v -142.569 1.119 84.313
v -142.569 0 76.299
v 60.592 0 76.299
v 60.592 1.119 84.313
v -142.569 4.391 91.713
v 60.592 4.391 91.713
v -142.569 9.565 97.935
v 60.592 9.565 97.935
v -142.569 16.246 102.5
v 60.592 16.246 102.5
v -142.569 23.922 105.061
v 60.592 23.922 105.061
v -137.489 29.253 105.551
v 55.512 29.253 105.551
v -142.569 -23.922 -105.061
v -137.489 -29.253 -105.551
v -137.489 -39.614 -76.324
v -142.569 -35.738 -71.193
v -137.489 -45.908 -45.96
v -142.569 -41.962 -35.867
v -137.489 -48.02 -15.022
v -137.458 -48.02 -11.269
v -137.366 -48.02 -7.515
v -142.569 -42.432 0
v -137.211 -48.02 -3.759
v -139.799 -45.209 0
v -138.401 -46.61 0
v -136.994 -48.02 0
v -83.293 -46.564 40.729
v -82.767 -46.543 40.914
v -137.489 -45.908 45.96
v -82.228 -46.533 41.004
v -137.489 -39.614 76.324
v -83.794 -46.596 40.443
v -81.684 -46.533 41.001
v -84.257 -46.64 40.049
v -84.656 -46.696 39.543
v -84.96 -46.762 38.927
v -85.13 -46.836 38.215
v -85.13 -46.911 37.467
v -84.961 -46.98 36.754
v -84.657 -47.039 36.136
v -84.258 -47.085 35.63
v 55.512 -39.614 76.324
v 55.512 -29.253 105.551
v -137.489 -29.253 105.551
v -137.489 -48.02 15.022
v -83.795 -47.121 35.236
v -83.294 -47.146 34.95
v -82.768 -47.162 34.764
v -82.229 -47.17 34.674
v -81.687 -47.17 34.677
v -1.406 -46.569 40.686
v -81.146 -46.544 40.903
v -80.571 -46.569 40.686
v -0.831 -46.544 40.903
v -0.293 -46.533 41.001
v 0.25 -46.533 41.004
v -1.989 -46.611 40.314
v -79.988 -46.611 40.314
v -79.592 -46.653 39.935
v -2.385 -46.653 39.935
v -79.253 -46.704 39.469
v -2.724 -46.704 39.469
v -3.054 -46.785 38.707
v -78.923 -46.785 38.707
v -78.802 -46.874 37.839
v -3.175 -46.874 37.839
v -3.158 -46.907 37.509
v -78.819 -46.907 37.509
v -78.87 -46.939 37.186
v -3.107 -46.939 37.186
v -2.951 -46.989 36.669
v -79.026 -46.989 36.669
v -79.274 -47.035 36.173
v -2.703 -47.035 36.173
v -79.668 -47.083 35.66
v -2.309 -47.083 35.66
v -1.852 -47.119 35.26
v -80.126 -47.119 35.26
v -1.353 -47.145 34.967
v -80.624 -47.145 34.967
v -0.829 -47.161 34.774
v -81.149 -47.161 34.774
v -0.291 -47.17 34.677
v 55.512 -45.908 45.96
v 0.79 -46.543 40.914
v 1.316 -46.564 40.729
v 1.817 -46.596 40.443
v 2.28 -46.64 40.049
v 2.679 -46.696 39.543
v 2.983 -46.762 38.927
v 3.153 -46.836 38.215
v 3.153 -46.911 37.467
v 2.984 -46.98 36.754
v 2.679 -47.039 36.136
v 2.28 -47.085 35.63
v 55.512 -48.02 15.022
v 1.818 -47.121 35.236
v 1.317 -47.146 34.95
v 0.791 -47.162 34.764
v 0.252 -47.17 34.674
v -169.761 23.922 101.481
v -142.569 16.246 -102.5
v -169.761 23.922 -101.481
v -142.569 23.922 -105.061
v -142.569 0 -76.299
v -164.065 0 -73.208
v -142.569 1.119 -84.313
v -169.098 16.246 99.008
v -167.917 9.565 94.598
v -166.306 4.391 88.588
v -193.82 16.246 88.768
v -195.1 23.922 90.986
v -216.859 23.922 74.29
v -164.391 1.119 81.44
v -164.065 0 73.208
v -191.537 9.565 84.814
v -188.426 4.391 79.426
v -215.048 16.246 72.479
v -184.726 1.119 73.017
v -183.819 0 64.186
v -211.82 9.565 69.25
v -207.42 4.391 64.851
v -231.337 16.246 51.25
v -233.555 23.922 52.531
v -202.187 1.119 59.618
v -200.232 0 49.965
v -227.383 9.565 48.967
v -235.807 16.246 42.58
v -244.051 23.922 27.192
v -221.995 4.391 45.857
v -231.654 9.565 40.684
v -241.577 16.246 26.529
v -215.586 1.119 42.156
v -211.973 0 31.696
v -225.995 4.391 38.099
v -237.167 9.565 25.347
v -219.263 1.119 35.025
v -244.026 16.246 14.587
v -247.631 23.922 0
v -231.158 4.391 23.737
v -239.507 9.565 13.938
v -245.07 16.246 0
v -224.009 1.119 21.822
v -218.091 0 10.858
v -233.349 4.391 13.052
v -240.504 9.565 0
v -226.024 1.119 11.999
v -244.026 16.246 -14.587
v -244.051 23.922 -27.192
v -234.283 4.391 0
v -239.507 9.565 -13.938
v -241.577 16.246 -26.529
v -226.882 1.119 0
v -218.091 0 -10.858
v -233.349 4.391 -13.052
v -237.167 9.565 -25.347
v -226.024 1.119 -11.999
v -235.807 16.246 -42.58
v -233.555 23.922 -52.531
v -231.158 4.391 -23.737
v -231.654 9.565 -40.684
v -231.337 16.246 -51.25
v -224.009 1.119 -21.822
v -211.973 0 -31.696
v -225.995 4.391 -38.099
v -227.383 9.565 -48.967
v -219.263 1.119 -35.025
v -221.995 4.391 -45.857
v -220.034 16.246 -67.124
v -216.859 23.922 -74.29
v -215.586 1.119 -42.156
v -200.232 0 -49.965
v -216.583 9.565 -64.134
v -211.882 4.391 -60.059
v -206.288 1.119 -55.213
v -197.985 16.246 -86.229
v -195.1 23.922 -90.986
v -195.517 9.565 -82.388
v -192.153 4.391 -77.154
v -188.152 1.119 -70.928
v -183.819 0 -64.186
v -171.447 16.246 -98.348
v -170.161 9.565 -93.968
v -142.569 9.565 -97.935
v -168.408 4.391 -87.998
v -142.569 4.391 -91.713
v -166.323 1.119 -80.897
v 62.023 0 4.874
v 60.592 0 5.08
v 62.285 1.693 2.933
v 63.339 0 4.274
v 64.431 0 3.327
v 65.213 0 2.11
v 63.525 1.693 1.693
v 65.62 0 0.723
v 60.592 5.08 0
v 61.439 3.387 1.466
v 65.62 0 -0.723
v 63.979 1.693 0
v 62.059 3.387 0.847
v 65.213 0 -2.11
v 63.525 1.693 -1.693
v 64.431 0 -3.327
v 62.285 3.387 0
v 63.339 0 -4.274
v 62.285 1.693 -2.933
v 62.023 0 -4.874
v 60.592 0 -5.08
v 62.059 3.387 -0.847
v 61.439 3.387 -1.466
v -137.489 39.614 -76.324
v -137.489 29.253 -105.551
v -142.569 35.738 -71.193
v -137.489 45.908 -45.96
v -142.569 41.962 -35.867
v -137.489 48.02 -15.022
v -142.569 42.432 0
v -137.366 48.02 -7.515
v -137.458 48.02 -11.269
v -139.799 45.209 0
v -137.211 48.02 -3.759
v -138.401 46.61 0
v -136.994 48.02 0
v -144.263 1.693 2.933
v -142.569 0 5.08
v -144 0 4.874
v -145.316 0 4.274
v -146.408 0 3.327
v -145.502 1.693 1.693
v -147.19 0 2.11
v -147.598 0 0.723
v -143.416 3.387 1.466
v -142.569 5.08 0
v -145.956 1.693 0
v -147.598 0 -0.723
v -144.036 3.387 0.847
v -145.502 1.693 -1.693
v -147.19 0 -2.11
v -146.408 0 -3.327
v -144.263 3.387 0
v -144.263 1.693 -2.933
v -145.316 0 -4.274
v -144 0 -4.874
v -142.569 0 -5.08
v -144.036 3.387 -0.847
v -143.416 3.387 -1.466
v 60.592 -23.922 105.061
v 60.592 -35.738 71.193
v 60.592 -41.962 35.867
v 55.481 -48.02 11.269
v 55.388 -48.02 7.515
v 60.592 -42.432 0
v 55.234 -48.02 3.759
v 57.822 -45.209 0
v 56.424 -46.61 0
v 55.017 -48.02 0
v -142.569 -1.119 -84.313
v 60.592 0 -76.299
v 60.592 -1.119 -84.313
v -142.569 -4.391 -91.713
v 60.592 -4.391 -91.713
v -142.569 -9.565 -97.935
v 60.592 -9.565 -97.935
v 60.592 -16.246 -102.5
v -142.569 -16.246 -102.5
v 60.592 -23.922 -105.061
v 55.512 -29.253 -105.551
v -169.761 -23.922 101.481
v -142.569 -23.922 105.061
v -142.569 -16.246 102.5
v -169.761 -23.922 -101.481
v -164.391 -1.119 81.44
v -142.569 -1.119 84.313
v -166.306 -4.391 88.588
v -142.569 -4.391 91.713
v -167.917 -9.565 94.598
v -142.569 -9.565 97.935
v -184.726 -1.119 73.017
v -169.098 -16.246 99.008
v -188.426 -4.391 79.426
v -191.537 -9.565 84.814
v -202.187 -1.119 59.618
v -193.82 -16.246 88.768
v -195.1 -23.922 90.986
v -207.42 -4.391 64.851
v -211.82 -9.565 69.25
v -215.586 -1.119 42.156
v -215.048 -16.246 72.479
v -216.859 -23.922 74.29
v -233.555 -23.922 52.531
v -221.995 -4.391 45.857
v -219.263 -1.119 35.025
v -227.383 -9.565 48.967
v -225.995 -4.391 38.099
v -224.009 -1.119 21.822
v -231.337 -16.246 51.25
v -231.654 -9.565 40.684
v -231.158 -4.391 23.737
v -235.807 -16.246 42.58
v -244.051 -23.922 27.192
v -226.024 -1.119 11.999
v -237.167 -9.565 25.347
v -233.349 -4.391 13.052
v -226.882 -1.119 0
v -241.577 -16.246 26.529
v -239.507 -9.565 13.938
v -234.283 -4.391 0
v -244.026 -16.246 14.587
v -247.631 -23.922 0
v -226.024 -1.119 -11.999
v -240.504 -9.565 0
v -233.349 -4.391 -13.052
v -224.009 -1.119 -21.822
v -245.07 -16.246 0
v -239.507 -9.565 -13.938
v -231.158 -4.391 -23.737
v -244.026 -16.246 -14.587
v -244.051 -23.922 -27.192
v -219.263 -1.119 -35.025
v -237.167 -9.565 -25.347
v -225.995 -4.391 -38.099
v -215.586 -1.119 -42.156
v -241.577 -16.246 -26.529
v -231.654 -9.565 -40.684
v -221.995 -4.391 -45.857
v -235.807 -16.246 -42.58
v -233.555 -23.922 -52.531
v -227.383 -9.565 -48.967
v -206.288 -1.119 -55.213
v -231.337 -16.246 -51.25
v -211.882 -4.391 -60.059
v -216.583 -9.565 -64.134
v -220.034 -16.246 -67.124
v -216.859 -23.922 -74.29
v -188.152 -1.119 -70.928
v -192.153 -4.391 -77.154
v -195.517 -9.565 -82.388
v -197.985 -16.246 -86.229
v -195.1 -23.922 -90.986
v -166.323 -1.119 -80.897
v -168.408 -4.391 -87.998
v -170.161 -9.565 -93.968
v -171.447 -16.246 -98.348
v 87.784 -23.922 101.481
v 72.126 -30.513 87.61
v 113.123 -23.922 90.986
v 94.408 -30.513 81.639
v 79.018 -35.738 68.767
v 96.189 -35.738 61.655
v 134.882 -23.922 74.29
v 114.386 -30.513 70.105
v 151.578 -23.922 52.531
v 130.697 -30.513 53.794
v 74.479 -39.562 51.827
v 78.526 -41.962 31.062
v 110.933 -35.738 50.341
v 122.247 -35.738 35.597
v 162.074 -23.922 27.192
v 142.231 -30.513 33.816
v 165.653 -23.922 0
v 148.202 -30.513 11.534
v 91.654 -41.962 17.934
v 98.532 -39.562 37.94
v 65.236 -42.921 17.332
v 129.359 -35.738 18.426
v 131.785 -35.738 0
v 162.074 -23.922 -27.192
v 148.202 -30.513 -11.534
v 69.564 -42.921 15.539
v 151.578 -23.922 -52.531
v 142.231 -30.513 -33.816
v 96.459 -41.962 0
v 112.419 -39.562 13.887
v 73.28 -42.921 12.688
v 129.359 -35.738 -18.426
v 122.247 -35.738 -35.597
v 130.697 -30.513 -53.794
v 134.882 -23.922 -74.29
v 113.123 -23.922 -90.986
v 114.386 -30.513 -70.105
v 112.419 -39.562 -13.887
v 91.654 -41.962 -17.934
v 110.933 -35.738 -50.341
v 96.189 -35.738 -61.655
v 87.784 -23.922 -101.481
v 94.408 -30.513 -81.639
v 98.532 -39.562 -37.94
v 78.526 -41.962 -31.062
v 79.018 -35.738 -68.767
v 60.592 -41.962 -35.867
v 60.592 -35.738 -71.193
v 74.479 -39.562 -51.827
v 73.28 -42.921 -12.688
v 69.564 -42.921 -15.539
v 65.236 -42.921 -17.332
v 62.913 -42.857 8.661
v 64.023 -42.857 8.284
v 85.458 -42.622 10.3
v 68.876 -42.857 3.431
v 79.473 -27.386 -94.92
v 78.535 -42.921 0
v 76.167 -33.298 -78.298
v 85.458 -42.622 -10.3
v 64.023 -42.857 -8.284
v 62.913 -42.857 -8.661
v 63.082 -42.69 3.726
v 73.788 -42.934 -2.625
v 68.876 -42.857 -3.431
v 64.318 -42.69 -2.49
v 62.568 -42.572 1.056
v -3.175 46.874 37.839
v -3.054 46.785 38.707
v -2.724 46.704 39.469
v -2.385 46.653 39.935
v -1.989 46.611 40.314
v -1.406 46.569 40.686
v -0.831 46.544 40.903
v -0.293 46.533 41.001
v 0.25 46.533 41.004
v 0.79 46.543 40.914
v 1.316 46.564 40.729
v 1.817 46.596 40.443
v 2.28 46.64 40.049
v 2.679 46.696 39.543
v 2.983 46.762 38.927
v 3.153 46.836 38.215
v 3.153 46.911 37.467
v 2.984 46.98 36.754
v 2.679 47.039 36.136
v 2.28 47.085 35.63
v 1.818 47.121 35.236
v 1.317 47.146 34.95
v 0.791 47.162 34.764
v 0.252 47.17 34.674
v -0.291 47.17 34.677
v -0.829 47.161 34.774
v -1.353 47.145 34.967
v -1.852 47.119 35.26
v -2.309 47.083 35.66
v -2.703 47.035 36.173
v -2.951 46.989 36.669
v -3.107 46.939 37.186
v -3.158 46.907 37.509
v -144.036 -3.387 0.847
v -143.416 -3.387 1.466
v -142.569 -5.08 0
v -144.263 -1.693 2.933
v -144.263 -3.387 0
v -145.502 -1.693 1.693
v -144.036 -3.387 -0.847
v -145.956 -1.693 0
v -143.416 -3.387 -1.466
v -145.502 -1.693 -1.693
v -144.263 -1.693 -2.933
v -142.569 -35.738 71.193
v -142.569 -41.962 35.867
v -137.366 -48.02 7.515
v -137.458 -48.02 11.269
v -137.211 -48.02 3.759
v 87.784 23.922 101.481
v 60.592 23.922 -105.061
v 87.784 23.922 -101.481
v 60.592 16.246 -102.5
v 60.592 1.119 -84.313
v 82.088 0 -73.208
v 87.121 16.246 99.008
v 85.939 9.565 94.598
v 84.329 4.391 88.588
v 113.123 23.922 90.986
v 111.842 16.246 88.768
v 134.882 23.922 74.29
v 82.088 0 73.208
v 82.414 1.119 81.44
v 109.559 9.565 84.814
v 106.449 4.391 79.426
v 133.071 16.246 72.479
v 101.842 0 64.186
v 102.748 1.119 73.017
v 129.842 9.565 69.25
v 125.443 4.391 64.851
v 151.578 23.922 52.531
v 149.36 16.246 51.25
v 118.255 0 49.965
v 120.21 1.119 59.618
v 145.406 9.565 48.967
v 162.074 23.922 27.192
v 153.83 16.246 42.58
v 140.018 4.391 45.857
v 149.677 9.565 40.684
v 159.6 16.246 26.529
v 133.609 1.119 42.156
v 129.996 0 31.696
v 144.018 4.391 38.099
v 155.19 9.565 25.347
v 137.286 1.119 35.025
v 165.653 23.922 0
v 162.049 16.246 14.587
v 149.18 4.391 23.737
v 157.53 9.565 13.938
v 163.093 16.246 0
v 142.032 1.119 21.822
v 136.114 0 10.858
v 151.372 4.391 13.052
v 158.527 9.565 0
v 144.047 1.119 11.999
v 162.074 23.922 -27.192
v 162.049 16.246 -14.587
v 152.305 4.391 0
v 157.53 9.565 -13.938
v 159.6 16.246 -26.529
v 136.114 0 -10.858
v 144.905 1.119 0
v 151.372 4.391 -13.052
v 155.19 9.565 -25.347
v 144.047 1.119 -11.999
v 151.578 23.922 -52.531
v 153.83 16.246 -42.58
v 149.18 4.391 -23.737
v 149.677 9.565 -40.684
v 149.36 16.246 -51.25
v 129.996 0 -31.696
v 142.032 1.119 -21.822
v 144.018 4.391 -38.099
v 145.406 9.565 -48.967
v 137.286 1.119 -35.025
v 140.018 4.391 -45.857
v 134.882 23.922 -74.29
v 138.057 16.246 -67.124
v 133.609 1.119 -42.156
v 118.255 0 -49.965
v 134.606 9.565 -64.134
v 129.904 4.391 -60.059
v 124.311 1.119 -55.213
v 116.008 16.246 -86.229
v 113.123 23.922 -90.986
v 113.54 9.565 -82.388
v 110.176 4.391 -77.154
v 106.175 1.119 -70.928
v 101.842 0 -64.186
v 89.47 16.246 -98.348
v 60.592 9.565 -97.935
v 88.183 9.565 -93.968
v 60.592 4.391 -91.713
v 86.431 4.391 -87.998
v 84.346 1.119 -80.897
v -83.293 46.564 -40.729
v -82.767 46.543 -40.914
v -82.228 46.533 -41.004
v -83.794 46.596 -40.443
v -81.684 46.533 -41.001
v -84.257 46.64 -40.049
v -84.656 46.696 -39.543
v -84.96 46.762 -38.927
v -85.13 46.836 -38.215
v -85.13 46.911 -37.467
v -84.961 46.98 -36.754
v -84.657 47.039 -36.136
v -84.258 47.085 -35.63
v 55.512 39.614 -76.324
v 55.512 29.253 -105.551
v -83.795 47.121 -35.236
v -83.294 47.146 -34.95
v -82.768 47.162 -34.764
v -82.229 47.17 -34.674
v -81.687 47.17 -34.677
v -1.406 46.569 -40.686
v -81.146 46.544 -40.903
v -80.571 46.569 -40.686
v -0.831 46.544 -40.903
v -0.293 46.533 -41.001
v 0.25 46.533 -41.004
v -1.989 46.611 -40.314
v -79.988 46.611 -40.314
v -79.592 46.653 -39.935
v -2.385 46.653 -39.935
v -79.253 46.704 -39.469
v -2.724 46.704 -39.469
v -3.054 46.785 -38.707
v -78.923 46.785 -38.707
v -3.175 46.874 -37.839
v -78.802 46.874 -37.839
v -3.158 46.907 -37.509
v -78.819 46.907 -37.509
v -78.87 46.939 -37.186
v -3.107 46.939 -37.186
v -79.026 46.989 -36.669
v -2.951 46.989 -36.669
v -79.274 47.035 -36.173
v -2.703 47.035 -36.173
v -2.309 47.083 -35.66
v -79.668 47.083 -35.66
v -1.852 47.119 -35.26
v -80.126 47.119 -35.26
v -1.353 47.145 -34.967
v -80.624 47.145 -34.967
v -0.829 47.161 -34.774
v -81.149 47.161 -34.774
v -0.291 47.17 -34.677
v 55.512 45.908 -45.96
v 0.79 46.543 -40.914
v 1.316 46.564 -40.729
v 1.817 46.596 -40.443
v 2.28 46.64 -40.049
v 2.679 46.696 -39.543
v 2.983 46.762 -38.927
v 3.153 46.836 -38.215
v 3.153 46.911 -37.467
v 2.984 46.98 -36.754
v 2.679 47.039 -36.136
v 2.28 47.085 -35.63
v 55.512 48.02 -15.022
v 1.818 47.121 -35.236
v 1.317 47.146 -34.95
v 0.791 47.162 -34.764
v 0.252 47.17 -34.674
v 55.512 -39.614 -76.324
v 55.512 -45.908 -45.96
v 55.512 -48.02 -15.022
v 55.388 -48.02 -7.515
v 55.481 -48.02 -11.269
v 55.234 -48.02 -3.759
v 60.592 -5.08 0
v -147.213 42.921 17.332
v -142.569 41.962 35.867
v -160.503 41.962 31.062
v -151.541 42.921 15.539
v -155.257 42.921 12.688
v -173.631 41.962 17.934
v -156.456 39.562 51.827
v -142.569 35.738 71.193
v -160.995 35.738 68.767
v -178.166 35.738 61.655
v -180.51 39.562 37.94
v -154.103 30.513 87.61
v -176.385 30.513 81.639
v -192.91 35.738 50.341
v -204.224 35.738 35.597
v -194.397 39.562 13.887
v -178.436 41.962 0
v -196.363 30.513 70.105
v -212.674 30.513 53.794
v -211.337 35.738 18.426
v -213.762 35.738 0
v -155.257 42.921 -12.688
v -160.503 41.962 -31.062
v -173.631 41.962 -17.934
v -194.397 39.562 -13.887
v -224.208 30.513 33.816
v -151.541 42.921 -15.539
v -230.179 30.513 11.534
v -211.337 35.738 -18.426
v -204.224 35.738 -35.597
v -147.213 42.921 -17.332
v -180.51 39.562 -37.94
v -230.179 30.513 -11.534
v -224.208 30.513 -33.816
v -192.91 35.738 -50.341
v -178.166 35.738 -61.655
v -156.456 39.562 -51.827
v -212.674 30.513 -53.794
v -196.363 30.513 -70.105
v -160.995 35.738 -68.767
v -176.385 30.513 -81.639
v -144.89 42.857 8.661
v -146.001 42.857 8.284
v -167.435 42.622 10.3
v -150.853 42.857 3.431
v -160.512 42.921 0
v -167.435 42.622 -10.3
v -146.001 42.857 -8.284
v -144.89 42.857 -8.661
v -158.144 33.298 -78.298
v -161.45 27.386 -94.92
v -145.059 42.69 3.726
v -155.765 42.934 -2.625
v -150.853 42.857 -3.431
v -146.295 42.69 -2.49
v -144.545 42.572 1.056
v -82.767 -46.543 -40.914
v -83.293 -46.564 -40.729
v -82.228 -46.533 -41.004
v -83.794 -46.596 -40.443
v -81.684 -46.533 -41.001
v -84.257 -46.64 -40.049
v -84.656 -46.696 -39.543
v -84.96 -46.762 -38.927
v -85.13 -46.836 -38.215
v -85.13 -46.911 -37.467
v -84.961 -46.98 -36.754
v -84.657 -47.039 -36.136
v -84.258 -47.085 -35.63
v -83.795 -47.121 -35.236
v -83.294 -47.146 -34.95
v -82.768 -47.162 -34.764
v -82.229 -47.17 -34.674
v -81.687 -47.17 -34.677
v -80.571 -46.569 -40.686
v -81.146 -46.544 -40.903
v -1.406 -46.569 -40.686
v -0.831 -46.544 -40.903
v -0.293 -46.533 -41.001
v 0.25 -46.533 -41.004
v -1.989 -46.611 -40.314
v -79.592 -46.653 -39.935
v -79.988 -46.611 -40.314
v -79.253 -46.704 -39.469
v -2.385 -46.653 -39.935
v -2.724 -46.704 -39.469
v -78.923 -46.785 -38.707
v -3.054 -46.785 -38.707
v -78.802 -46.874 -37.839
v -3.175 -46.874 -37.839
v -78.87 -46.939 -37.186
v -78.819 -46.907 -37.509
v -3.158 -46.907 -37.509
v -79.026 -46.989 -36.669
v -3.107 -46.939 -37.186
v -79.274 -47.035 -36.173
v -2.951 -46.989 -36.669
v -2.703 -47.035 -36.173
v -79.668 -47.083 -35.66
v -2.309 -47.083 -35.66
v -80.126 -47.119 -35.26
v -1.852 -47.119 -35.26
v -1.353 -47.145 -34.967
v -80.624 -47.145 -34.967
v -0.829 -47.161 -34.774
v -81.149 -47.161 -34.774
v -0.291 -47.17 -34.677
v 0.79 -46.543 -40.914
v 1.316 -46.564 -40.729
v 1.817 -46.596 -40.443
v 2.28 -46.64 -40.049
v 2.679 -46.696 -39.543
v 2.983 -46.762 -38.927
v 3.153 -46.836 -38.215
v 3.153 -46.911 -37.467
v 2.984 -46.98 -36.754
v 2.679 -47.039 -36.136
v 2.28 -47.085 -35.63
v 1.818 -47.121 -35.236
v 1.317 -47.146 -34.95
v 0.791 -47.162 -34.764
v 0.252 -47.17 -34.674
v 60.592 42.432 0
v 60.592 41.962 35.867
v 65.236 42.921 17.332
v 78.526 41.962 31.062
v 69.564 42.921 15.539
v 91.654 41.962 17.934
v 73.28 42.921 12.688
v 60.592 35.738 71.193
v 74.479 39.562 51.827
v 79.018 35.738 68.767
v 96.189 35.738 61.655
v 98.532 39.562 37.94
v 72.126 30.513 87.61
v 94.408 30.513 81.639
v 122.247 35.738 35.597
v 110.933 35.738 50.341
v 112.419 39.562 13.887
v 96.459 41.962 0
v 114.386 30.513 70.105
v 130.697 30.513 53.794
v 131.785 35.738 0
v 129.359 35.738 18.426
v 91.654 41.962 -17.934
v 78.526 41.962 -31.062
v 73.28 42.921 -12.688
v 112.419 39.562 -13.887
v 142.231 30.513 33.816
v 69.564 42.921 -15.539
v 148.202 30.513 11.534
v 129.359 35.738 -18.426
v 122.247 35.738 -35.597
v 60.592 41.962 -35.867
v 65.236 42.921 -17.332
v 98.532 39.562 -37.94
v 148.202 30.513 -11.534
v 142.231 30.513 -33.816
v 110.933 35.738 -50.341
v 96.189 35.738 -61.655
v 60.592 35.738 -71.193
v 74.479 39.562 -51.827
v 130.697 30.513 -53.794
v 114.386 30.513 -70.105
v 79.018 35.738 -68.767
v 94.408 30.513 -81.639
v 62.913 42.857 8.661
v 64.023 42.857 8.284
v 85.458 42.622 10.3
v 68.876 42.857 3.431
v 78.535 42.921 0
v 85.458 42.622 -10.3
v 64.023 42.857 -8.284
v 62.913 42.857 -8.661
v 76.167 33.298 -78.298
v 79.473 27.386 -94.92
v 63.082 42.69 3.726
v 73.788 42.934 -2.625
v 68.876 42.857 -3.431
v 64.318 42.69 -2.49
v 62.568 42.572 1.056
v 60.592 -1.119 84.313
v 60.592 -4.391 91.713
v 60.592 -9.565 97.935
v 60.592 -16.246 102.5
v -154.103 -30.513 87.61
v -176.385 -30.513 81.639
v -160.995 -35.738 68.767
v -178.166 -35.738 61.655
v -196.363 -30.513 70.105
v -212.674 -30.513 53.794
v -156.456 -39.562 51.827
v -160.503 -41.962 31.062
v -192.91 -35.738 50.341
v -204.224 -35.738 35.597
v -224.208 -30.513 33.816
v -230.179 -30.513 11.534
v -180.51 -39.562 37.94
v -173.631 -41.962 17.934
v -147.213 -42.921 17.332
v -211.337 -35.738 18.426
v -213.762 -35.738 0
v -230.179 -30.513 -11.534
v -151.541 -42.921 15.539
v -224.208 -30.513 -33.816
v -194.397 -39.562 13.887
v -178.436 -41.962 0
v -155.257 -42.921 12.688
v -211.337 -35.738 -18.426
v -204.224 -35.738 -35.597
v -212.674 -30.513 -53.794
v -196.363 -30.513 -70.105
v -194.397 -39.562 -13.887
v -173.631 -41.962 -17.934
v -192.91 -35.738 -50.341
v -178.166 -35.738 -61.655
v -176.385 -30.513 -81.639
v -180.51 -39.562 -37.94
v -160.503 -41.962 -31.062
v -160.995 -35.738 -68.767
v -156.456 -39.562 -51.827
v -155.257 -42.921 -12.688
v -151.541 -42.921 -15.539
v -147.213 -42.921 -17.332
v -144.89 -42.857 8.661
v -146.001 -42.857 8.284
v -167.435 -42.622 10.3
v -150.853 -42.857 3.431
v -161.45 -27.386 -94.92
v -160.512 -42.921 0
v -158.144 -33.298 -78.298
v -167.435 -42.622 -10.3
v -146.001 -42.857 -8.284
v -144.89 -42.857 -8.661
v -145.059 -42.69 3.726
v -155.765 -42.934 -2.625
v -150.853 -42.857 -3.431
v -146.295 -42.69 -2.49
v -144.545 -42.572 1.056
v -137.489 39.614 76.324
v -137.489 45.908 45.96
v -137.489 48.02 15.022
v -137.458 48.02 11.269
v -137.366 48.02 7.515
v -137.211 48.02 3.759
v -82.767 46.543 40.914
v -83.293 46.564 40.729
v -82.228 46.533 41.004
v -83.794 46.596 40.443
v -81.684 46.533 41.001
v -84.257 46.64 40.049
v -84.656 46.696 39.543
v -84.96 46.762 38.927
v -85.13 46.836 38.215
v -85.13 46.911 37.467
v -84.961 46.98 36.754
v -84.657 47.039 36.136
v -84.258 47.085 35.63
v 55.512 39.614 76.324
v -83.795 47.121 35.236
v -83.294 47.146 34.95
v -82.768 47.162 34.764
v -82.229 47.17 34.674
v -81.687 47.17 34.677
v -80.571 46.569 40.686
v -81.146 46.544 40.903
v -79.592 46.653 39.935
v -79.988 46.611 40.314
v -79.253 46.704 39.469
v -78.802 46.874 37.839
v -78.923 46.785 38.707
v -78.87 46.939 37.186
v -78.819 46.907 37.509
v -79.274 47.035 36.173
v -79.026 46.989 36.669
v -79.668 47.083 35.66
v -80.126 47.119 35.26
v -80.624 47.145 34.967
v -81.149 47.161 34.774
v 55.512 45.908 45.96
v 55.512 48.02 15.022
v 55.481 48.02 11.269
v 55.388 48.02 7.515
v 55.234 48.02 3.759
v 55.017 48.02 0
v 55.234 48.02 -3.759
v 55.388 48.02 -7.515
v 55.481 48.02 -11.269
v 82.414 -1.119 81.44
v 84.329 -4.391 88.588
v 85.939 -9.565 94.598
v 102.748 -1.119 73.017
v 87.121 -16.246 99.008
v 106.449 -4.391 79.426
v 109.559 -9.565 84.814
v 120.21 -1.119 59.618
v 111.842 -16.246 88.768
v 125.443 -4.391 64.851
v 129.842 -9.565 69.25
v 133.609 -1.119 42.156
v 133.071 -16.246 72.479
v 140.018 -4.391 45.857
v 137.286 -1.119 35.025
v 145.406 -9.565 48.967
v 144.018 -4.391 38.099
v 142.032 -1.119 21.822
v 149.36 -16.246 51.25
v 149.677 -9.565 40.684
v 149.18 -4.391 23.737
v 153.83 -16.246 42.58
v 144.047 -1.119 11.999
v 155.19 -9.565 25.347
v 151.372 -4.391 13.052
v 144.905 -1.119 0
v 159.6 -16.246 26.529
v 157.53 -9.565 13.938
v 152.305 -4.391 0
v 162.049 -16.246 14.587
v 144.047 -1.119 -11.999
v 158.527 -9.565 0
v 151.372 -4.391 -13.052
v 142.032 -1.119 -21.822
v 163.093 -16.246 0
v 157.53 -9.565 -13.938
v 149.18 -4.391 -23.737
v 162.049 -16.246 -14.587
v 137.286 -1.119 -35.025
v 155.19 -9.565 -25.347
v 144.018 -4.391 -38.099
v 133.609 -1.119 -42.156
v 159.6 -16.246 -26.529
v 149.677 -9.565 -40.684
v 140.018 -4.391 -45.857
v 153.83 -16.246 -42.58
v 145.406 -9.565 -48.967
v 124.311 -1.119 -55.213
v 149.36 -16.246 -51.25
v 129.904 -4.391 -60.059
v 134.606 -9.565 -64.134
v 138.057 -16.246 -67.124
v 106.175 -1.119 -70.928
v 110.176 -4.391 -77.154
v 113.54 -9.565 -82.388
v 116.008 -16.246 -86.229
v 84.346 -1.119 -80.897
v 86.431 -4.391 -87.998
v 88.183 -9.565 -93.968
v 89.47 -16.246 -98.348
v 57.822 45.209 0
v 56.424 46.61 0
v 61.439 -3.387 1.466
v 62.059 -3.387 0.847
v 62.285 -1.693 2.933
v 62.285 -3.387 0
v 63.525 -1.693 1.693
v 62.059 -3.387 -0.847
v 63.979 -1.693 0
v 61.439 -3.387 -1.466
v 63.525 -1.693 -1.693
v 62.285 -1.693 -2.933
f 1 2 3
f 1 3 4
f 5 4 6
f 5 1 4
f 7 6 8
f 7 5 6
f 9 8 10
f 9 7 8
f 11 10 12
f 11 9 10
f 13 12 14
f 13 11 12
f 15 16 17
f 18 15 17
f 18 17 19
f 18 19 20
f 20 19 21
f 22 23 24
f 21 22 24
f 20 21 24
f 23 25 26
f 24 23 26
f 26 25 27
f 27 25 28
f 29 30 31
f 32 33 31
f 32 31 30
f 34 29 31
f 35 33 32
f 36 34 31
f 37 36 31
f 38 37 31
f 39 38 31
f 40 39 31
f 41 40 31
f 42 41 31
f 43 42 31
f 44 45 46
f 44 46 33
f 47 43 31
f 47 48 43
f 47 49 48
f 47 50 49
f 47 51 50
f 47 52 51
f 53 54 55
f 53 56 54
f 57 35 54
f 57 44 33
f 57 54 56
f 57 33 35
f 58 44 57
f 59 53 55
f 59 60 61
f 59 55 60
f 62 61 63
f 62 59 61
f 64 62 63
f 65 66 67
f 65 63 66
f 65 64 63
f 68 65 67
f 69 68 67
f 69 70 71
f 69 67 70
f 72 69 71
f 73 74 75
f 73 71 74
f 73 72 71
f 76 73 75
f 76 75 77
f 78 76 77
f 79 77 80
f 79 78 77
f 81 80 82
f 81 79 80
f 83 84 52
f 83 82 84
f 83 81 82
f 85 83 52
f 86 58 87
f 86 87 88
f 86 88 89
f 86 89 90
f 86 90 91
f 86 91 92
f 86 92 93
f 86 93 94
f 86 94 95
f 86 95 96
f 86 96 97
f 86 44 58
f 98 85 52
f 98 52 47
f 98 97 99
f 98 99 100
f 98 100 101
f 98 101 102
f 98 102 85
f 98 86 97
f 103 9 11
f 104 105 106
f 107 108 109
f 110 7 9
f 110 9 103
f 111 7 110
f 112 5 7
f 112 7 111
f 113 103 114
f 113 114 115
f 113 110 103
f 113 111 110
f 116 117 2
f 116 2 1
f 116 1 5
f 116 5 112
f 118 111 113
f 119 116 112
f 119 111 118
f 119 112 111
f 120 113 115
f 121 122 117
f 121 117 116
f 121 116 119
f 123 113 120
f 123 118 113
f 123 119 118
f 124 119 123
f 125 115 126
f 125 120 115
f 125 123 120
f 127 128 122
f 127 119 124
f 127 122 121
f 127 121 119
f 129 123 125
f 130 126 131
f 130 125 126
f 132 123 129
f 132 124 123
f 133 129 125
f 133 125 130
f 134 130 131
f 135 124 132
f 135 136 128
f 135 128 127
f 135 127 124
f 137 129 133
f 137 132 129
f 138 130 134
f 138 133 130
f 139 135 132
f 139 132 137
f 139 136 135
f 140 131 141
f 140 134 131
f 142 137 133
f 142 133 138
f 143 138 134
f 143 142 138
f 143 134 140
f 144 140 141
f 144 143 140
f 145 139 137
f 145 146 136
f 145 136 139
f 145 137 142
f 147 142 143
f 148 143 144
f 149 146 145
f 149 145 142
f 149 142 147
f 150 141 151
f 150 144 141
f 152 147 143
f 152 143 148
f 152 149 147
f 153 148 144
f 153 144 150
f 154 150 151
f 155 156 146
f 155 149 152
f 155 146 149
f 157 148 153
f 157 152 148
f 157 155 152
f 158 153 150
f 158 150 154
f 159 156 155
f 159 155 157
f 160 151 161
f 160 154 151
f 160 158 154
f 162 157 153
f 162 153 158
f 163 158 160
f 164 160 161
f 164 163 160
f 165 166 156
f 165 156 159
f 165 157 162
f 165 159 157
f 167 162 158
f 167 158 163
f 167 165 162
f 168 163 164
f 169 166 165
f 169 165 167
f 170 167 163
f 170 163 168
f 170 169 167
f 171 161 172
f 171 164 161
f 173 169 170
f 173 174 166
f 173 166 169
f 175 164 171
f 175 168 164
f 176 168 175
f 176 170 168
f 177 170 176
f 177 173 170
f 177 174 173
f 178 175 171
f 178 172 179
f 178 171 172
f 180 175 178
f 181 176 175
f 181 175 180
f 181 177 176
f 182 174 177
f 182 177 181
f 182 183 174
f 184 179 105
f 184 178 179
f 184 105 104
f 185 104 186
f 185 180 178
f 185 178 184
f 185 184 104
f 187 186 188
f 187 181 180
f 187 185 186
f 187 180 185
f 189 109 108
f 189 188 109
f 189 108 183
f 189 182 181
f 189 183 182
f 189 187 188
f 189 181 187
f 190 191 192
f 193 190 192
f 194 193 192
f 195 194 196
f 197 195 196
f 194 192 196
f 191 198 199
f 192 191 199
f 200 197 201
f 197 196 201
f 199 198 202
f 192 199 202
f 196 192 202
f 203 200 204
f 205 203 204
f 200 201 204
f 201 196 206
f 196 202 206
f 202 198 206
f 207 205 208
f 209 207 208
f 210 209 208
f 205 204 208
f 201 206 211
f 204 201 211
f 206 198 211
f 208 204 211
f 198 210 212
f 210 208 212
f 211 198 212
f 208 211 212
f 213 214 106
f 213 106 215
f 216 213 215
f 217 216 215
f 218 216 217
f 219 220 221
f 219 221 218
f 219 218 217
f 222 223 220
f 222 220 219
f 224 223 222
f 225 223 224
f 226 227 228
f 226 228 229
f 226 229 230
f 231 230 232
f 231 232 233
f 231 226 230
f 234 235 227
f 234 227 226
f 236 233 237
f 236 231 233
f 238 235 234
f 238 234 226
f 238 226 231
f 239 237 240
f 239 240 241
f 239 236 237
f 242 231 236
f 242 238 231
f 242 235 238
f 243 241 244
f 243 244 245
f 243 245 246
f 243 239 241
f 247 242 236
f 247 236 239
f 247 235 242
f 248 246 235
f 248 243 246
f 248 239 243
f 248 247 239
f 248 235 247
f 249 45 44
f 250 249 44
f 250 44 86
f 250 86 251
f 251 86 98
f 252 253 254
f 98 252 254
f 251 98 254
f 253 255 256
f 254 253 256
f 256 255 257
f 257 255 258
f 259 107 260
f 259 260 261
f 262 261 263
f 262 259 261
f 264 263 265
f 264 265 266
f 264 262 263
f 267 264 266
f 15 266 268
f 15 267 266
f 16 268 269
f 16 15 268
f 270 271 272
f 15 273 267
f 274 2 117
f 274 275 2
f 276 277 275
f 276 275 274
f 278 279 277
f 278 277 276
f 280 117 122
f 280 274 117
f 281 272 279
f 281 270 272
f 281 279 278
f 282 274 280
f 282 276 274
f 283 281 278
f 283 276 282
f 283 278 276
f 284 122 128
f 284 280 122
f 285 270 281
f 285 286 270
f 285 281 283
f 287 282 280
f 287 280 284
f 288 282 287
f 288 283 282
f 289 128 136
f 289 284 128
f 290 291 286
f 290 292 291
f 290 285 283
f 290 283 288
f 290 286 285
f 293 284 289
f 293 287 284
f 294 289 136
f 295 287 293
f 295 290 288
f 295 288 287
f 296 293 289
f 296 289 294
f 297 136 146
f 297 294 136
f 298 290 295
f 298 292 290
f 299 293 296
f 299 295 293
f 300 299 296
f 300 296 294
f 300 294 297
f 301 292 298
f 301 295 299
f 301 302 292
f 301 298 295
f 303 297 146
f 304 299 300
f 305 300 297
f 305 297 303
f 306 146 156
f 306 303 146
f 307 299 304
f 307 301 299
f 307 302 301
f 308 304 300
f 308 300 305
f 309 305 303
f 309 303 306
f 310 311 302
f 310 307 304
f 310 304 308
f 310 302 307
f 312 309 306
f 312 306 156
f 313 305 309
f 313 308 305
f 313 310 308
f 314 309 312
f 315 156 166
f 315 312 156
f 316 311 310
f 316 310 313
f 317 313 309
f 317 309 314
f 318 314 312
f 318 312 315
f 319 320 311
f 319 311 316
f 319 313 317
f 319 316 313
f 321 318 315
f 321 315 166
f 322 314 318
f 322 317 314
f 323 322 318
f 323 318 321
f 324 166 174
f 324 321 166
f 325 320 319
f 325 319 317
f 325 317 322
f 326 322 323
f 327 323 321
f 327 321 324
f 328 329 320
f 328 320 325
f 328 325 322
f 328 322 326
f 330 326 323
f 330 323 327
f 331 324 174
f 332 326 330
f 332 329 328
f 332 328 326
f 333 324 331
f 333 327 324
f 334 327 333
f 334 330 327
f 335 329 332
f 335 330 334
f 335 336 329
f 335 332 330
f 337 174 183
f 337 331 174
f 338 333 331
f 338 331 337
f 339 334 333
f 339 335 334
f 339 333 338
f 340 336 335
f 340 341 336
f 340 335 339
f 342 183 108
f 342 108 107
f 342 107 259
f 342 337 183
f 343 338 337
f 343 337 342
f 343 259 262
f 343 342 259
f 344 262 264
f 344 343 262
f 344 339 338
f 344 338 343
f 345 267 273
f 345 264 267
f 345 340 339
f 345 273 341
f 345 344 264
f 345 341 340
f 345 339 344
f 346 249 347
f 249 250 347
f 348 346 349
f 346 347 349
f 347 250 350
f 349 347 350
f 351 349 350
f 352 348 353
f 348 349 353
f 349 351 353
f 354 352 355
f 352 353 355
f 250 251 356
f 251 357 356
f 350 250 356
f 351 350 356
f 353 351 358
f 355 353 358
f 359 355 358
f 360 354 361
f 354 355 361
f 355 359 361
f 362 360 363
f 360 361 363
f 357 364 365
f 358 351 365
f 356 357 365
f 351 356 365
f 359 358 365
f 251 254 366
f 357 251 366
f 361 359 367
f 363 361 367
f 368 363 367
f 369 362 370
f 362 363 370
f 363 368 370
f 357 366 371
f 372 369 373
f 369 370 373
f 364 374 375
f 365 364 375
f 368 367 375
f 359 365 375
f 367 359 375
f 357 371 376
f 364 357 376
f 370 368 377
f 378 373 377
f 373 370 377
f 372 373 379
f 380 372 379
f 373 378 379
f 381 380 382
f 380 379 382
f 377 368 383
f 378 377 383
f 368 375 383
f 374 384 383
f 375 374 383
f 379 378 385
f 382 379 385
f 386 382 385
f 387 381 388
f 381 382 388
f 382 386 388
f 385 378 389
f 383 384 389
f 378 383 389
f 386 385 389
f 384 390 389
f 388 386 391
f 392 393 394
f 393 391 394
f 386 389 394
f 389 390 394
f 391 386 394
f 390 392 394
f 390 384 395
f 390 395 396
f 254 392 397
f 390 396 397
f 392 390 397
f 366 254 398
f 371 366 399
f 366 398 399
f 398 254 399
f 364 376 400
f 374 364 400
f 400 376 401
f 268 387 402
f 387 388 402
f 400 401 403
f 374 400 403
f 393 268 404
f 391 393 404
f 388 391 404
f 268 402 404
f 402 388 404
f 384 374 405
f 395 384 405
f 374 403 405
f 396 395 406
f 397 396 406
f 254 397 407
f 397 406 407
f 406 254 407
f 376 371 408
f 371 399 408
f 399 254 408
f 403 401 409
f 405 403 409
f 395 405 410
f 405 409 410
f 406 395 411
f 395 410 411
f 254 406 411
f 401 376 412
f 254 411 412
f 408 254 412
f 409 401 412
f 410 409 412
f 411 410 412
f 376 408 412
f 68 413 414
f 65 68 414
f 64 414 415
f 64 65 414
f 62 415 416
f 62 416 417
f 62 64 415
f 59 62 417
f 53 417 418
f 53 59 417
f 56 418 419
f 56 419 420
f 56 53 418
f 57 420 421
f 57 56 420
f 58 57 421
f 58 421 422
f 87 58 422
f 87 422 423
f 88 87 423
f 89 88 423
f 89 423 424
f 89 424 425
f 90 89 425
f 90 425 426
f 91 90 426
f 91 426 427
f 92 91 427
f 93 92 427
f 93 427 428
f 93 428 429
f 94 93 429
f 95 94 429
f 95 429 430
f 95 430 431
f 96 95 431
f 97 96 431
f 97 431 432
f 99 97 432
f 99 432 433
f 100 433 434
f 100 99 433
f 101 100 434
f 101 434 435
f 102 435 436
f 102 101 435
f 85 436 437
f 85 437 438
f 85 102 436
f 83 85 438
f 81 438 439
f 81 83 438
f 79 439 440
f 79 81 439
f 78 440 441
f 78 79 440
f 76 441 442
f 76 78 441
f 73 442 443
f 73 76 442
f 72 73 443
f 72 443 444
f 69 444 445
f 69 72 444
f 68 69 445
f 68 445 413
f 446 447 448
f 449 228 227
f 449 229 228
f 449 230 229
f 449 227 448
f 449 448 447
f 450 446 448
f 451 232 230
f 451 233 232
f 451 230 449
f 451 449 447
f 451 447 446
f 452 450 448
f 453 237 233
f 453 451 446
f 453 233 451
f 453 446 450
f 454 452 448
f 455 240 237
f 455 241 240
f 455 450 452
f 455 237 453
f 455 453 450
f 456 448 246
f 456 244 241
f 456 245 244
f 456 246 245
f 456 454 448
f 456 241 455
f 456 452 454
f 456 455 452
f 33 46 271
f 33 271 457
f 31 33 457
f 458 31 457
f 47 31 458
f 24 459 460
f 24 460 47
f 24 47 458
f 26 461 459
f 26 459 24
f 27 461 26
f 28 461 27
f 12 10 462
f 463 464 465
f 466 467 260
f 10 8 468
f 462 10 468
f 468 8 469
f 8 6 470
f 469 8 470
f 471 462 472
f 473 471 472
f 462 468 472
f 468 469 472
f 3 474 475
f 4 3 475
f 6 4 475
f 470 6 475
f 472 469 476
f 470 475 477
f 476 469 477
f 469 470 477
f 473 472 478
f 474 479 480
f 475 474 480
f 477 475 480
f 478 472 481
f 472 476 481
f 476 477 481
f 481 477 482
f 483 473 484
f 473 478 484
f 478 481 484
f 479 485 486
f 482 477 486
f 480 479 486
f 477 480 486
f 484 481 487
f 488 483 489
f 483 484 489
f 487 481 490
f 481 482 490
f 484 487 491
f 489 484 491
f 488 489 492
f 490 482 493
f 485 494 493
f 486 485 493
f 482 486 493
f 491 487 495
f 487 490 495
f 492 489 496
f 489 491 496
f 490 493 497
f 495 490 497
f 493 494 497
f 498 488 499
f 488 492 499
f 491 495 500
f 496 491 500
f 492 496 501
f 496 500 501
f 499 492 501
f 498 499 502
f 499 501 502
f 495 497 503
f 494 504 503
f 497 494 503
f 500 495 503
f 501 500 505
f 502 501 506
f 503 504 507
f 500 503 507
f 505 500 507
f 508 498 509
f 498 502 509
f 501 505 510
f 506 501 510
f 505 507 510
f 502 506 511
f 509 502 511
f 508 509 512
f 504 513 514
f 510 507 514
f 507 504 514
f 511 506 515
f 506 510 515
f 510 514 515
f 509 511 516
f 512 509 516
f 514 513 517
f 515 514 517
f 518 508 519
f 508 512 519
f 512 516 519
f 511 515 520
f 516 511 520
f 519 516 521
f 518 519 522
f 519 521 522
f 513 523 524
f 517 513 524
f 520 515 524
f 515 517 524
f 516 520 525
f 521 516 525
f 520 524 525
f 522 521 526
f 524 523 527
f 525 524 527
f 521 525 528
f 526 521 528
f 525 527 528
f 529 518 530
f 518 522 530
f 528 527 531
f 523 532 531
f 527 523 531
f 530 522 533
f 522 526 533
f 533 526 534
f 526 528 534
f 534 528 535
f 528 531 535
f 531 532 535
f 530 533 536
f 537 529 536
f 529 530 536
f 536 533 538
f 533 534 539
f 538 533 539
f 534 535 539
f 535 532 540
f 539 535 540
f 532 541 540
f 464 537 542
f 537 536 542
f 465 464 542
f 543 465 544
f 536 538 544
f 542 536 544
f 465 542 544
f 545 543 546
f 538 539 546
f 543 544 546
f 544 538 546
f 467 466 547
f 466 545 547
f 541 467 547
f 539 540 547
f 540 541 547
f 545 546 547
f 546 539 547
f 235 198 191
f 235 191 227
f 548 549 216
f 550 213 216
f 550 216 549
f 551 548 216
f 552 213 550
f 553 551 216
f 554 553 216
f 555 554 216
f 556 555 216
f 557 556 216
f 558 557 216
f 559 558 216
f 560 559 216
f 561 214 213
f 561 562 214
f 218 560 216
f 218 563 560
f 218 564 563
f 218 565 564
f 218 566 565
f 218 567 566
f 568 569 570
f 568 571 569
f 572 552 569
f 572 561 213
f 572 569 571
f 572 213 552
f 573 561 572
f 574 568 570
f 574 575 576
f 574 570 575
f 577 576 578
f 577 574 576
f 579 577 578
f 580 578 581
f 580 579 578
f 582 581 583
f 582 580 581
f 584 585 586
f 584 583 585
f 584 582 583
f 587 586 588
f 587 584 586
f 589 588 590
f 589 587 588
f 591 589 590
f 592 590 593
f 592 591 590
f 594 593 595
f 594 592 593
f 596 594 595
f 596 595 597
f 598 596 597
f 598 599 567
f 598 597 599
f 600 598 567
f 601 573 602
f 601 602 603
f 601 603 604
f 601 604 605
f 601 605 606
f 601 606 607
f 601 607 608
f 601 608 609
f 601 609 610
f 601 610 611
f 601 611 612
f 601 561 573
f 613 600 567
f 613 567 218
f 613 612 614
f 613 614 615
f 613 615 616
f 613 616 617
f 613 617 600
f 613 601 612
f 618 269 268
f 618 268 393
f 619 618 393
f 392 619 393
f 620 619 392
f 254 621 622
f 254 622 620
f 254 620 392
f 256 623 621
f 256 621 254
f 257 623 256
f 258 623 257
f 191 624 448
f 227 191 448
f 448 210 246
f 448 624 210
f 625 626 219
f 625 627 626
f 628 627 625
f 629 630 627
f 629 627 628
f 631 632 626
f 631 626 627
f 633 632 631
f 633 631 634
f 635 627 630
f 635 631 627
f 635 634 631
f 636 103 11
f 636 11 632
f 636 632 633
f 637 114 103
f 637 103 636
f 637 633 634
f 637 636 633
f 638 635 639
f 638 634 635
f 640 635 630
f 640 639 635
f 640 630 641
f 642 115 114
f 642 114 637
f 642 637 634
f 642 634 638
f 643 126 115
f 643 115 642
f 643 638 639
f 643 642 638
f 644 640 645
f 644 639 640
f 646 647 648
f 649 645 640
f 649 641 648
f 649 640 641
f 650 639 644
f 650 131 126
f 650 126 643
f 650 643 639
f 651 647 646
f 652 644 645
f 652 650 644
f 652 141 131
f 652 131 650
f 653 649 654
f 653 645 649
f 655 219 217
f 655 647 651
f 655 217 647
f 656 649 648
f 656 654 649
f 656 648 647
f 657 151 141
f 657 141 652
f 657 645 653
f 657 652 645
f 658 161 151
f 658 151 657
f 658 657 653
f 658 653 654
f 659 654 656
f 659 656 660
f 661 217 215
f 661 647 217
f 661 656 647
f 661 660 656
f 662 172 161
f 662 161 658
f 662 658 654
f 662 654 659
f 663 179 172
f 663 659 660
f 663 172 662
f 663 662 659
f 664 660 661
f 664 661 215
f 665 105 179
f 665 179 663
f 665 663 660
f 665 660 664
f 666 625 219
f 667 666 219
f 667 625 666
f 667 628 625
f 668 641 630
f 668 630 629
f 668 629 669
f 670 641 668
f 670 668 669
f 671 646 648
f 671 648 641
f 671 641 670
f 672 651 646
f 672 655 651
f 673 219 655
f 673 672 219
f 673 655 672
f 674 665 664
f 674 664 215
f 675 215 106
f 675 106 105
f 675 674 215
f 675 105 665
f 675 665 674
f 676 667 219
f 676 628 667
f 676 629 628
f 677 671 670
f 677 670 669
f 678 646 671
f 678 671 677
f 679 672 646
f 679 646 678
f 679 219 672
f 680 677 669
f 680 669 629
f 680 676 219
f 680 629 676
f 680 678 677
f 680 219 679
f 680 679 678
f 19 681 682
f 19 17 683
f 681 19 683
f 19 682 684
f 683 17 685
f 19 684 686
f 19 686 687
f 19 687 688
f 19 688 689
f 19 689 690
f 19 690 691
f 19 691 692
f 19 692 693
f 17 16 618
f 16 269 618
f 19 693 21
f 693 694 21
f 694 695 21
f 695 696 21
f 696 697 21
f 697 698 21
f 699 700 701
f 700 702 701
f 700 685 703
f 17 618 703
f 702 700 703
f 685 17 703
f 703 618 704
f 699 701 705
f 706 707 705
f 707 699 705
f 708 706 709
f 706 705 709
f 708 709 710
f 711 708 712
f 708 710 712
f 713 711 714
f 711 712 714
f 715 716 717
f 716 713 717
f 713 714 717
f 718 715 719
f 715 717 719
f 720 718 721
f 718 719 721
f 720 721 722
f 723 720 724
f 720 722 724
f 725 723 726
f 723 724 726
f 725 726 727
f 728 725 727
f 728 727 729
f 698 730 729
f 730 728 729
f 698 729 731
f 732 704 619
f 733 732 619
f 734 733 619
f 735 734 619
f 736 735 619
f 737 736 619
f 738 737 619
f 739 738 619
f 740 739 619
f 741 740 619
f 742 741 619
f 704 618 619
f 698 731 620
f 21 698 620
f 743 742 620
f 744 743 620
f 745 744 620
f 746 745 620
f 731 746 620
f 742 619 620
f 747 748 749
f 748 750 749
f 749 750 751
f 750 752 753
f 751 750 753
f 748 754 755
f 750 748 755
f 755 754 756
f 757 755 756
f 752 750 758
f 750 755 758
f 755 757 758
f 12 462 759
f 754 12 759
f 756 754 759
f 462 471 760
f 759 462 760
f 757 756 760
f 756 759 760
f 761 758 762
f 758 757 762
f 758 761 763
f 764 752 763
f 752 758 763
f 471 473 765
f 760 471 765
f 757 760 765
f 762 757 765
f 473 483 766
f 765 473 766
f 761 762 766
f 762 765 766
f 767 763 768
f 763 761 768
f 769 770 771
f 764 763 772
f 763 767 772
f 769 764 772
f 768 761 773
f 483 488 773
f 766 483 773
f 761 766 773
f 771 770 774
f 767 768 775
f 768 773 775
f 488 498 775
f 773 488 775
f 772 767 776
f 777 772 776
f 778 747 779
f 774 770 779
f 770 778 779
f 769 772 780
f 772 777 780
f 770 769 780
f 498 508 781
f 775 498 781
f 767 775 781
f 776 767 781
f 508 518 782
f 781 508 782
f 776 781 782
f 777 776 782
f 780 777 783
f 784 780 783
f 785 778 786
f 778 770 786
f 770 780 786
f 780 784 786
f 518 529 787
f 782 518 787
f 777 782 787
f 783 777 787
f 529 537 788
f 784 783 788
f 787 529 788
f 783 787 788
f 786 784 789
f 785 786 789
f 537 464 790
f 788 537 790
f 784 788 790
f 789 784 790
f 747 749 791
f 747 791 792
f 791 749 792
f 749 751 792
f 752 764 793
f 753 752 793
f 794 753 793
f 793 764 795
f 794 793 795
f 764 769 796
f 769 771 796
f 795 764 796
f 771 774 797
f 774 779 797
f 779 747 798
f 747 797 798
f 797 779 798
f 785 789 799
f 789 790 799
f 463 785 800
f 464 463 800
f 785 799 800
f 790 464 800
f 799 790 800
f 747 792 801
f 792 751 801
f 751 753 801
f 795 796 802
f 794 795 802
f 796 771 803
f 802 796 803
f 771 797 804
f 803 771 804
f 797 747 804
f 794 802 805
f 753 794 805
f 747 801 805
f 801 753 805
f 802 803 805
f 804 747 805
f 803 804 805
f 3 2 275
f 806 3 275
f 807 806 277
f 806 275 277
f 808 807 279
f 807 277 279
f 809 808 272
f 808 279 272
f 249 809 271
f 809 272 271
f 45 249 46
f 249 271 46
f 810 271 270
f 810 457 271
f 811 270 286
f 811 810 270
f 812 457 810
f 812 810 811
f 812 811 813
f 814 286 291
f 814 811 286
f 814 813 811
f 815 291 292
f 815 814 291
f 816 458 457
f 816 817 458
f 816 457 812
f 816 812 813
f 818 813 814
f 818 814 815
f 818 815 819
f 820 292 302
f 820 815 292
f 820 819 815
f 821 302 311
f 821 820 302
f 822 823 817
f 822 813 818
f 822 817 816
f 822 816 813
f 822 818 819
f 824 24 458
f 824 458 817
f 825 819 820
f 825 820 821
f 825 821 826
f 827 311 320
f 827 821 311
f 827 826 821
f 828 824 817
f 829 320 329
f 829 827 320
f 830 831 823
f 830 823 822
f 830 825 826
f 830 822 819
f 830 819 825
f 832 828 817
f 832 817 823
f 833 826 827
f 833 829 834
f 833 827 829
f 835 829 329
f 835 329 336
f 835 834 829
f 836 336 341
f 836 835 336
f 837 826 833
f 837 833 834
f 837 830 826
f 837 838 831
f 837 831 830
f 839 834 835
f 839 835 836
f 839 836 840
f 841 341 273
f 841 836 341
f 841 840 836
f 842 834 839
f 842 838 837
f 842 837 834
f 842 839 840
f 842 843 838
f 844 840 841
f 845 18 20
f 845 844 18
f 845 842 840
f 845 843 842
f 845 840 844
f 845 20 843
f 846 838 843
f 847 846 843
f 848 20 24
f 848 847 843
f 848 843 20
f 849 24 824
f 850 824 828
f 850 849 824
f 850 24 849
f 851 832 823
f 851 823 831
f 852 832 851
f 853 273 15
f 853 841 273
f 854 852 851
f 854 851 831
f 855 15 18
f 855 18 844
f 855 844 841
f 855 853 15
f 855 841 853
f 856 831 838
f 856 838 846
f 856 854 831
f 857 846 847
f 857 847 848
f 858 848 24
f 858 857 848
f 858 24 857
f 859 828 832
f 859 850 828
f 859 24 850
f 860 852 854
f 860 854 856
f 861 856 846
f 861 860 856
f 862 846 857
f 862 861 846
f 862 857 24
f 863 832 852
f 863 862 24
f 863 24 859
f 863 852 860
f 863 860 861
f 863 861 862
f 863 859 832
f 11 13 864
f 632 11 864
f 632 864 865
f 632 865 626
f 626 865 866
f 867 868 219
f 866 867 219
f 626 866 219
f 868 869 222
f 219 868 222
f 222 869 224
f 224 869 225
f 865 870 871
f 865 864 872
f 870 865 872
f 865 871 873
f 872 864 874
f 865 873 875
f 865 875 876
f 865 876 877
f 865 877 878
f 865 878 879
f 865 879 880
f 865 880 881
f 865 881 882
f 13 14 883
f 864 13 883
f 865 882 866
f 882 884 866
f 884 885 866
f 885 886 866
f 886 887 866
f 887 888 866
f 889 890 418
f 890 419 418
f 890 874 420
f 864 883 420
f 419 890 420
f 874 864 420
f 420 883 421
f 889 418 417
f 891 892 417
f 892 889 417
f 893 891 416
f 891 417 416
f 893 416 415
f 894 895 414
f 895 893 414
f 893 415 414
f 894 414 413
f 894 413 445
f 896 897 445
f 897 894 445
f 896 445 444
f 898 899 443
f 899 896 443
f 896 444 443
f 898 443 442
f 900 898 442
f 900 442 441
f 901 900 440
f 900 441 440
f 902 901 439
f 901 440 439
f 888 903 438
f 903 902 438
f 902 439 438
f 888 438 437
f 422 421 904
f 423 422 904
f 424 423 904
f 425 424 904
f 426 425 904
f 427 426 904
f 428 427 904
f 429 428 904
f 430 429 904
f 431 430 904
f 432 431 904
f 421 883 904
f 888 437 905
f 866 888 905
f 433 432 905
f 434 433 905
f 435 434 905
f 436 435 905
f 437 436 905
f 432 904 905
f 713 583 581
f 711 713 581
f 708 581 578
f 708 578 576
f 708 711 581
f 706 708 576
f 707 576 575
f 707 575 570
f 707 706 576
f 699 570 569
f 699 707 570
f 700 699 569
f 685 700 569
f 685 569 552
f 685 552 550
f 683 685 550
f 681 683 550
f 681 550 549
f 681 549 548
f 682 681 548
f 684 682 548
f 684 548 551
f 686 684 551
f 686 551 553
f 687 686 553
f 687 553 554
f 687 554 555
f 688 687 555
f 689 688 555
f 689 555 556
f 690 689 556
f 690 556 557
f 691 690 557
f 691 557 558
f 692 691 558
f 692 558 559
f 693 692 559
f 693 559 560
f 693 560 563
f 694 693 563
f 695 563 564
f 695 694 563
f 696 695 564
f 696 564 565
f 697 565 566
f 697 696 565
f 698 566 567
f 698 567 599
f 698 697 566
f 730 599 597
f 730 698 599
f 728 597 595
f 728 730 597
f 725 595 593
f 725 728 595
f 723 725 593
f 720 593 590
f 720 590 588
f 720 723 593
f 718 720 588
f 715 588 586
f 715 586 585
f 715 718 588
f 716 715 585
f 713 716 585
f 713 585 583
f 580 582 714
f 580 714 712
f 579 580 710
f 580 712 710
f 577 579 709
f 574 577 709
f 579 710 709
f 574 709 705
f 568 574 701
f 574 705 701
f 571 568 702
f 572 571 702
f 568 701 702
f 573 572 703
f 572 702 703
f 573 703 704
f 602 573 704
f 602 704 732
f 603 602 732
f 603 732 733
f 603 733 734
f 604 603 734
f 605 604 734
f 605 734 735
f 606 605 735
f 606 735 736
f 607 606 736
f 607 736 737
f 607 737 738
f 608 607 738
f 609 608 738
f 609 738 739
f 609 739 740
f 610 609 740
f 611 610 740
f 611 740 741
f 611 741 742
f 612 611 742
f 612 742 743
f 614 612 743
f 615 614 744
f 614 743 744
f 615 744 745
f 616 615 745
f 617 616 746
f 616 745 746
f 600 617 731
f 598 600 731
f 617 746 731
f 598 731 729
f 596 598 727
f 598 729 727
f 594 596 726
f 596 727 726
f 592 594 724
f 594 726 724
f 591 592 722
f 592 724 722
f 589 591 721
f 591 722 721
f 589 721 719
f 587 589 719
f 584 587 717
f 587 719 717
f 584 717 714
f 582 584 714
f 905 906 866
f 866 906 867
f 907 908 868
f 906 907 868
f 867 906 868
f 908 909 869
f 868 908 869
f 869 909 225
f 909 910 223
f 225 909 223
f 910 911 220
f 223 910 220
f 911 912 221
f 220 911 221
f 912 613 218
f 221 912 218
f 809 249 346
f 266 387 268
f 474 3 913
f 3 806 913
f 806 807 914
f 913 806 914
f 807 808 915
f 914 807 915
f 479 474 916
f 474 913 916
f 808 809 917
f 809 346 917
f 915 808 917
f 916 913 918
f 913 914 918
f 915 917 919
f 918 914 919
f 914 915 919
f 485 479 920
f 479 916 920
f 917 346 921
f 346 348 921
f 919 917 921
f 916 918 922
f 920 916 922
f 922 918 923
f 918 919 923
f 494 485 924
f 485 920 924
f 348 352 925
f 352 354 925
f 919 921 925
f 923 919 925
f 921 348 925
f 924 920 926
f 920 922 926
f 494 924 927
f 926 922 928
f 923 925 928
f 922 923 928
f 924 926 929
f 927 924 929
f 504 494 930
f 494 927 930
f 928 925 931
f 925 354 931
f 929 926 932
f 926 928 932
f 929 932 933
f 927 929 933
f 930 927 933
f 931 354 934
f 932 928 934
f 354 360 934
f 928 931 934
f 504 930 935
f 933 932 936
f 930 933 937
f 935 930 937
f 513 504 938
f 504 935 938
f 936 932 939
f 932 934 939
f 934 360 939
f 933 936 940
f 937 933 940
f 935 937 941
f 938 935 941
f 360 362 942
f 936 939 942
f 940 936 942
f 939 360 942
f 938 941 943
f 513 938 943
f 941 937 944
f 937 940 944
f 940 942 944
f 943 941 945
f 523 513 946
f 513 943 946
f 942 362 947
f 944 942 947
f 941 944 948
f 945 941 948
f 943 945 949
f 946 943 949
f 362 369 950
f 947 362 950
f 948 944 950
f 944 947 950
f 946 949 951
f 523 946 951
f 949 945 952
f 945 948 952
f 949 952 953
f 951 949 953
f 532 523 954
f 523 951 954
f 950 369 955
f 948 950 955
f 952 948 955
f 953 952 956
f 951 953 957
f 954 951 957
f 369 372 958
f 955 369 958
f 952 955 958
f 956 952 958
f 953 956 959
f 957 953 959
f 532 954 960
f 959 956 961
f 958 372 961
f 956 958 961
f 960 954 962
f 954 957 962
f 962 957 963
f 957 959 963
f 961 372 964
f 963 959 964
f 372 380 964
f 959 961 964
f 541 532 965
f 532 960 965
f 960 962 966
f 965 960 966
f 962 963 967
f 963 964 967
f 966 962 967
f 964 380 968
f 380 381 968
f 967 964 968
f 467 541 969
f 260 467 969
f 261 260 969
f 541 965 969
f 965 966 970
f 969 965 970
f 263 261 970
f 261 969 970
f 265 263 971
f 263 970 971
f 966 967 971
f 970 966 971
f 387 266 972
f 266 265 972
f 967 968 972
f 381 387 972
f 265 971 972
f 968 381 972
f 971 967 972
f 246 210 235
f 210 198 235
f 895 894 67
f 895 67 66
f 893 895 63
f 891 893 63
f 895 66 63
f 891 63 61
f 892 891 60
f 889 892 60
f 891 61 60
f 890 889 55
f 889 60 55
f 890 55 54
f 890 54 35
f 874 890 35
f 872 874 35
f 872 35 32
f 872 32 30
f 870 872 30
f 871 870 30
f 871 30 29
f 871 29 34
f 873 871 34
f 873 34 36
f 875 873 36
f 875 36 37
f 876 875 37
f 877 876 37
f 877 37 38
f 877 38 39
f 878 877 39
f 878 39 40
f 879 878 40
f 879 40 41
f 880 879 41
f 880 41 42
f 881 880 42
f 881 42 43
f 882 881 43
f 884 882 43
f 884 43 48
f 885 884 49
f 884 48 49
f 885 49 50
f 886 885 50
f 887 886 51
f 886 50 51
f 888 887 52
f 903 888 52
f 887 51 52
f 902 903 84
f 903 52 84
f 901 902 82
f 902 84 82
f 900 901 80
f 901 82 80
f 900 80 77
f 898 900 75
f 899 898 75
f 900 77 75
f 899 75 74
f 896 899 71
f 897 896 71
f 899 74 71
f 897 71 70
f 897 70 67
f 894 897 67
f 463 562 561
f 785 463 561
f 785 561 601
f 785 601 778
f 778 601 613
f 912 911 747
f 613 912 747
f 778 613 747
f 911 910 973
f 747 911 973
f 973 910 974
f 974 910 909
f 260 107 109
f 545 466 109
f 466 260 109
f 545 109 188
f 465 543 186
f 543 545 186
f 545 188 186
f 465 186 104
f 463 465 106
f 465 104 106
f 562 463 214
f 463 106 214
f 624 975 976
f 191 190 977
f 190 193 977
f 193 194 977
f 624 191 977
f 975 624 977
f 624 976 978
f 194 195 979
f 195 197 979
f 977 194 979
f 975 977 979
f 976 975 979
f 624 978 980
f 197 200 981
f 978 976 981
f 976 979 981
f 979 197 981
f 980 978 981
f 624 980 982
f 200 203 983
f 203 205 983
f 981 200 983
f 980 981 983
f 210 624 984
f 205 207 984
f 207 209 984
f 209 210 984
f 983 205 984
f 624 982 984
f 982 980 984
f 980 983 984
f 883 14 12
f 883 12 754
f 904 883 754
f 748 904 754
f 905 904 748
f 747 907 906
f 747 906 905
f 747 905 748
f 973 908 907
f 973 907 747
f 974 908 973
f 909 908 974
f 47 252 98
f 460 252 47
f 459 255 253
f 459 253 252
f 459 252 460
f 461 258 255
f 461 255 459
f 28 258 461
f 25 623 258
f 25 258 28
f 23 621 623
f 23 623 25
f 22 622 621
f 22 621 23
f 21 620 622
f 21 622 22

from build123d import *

# Parameters (mm, degrees)
F0_W        = 101.5806943178
F0_H        = 48.01966995
F1_DEPTH    = 105.5511329323
F2_R        = 29.2525430431
F3_T1_DEPTH = 554.2240944956
F4_SIZE     = 5.08
F5_T2_ANGLE = 31.2878347999
F7_D        = 6.35
F9_ANGLE    = 180


# Not quite as in the source:
# - a fillet or chamfer that OpenCascade refuses, or shapes differently, is made with other operations: its cross-section is extruded or revolved along the edge and cut away or added


with BuildPart() as f1:
    # F0 (on Top) → F1 (new body)
    with BuildSketch(Plane.XY):
        with Locations((9.8017528653, 24.009834975)):
            Rectangle(F0_W, F0_H)
    extrude(amount=F1_DEPTH)

    # F2
    f2_edges = [f1.edges().sort_by_distance(p)[0] for p in [
        (9.801753, 0, 105.551133),
    ]]
    fillet(f2_edges, radius=F2_R)

    # F3: fillet of radius 227.7292364389 on 1 edges, made by hand

    # F3_s2 → F3_t1 (cut)
    with BuildSketch(Plane.YZ.offset(-267.3102943825)):
        with BuildLine():
            ThreePointArc((29.2525430431, 105.5511329323), (43.2785349621, 61.2491955933), (48.01966995, 15.0224528968))
            Line((48.01966995, 15.0224528968), (48.01966995, 105.5511329323))
            Line((48.01966995, 105.5511329323), (29.2525430431, 105.5511329323))
        make_face()
    extrude(amount=F3_T1_DEPTH, mode=Mode.SUBTRACT)

    # F4
    f4_edges = [f1.edges().sort_by_distance(p)[0] for p in [
        (9.801753, 0, 0),
    ]]
    chamfer(f4_edges, length=F4_SIZE)

    # F5: chamfer of 5.08 on 1 edges, made by hand

    # F5_s1 → F5_t2 (revolve, cut)
    with BuildSketch(Plane(origin=(0, -44.077363084, 85.1947407747), x_dir=(1, 0, 0), z_dir=(0, -0.4595143579, 0.8881703411))):
        with BuildLine():
            Line((61.6697307588, 68.8619315298), (54.4344692897, 76.0971929988))
            Line((54.4344692897, 76.0971929988), (54.4344692897, 76.8591929988))
            ThreePointArc((54.4344692897, 76.8591929988), (57.513284657, 75.7815622643), (60.5921000242, 75.7815622643))
            Line((60.5921000242, 75.7815622643), (61.3541000242, 75.0195622643))
            ThreePointArc((61.3541000242, 75.0195622643), (61.3541000242, 71.9407468971), (62.4317307588, 68.8619315298))
            Line((62.4317307588, 68.8619315298), (61.6697307588, 68.8619315298))
        make_face()
    revolve(axis=Axis((60.5921000242, -179.7095664878, 15.022452897), (-1, 0, 0)), revolution_arc=F5_T2_ANGLE, mode=Mode.SUBTRACT)

    # F7 (through all)
    with Locations(Plane.XZ):
        with Locations((0, 37.8390811384)):
            Hole(F7_D / 2)

    # F8: F1 across plane


with BuildPart() as f1_1:
    add(f1.part)
    add(f1.part.mirror(Plane.XZ))

    # F8_face (on face) → F9 (revolve)
    with BuildSketch(Plane(origin=(60.5921000242, 0, 46.1455237947), x_dir=(0, 1, 0), z_dir=(1, 0, 0))):
        with BuildLine():
            Line((0, -41.0655237947), (5.08, -46.1455237947))
            Line((5.08, -46.1455237947), (42.432298984, -46.1455237947))
            ThreePointArc((42.432298984, -46.1455237947), (39.5623129602, 7.5101449883), (23.9216912378, 58.9157727391))
            ThreePointArc((23.9216912378, 58.9157727391), (6.7619645003, 48.8582833159), (0, 30.1530660945))
            ThreePointArc((0, 30.1530660945), (-6.7619645003, 48.8582833159), (-23.9216912378, 58.9157727391))
            ThreePointArc((-23.9216912378, 58.9157727391), (-39.5623129602, 7.5101449883), (-42.432298984, -46.1455237947))
            Line((-42.432298984, -46.1455237947), (-5.08, -46.1455237947))
            Line((-5.08, -46.1455237947), (0, -41.0655237947))
        make_face()
    revolve(axis=Axis((60.5921000242, -23.756149492, 0), (0, 1, 0)), revolution_arc=F9_ANGLE)

    # F10: F1 across face


with BuildPart() as f1_2:
    add(f1_1.part)
    add(f1_1.part.mirror(Plane(origin=(9.6264102551, 26.4795740308, 0), x_dir=(1, 0, 0), z_dir=(0, 0, -1))))

    # F11: F1 across face


with BuildPart() as f1_3:
    add(f1_2.part)
    add(f1_2.part.mirror(Plane(origin=(-40.9885942936, 0, 0), x_dir=(0, -1, 0), z_dir=(-1, 0, 0))))


solid = f1_3.part
